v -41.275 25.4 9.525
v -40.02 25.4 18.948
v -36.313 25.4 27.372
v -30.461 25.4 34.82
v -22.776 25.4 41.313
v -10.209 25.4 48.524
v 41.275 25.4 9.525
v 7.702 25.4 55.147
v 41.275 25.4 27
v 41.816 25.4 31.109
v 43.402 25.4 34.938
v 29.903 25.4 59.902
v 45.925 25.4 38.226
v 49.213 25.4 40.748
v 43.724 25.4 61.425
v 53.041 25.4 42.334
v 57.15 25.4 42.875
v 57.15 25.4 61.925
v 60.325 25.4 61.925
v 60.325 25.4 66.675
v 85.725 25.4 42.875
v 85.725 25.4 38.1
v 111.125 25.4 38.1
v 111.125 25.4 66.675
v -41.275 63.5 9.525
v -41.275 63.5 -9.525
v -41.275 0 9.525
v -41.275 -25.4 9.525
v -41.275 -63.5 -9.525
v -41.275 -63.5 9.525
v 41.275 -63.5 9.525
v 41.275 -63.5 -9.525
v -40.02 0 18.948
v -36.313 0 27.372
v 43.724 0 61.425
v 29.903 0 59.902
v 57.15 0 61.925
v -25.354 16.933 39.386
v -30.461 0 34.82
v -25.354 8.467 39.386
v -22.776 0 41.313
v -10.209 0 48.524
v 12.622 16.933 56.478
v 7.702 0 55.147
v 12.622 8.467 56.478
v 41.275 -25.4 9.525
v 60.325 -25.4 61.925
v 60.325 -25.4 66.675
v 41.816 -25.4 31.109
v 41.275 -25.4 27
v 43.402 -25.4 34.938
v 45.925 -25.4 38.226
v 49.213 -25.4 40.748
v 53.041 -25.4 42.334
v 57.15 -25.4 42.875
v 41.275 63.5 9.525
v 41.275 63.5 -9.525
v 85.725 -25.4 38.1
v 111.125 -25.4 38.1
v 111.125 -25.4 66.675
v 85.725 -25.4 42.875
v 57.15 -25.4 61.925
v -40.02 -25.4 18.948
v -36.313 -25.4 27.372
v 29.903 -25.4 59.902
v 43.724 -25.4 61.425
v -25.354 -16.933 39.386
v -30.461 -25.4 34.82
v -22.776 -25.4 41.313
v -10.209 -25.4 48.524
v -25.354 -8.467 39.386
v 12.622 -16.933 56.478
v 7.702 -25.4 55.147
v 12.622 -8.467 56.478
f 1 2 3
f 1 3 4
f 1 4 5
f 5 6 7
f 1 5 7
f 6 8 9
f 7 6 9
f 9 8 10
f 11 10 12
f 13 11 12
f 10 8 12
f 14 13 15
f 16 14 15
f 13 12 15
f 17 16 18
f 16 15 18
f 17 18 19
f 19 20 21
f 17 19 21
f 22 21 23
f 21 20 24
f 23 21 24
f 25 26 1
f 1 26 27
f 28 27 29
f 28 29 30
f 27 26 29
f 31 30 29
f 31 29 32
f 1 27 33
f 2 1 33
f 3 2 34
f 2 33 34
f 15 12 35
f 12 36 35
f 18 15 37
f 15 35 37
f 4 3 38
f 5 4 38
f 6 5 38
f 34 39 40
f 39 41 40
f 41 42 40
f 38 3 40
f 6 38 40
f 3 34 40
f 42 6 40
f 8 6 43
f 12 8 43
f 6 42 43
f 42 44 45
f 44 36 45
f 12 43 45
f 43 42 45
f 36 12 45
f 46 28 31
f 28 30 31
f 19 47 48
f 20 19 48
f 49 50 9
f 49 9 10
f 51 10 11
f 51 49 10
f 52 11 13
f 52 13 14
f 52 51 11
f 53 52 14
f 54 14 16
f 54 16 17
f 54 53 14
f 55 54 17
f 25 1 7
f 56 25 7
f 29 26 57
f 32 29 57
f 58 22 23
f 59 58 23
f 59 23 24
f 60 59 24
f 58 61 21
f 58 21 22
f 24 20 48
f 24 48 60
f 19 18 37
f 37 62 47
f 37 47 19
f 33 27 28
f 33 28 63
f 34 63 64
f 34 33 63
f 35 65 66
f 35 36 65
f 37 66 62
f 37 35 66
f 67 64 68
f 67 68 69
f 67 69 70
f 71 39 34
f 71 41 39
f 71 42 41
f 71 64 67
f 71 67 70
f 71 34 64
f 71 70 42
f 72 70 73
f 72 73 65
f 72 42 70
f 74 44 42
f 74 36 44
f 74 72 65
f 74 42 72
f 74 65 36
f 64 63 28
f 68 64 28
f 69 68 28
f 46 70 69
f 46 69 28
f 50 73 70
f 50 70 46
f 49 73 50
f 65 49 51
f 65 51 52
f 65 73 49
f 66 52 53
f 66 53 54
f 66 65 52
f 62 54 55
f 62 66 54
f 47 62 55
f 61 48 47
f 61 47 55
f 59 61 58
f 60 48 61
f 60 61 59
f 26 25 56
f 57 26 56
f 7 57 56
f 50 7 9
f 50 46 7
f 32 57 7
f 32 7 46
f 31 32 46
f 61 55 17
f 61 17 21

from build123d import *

# Parameters (mm, degrees)
F0_W     = 82.55
F0_H     = 19.05
F1_DEPTH = 63.5
F2_DEPTH = 25.4
F0_W_2   = 25.4
F3_DEPTH = 25.4
F4_DEPTH = 25.4
F0_H_2   = 4.7498
F5_DEPTH = 25.4


with BuildPart() as f1:
    # F0 (on Front) → F1 (new body, symmetric)
    with BuildSketch(Plane.XZ):
        Rectangle(F0_W, F0_H)
    extrude(amount=F1_DEPTH, both=True)

    # F0 (on Front) → F2 (join, symmetric)
    with BuildSketch(Plane.XZ):
        with BuildLine():
            Line((-41.275, 9.525), (41.275, 9.525))
            Line((41.275, 9.525), (41.275, 27.0002))
            ThreePointArc((41.275, 27.0002), (45.9246798487, 38.2255201513), (57.15, 42.8752))
            Line((57.15, 42.8752), (60.325, 42.8752))
            Line((60.325, 42.8752), (60.325, 61.9252))
            Line((60.325, 61.9252), (57.15, 61.9252))
            add(Edge.make_bspline(
                [(-41.275, 9.525), (-41.5499731898, 46.1455024779), (14.5141012144, 61.9252), (57.15, 61.9252)],
                knots=[0, 0, 0, 0, 111.5045361635, 111.5045361635, 111.5045361635, 111.5045361635], degree=3))
        make_face()
    extrude(amount=F2_DEPTH, both=True)

    # F0 (on Front) → F3 (join, symmetric)
    with BuildSketch(Plane.XZ):
        with Locations((73.025, 52.4002)):
            Rectangle(F0_W_2, F0_H)
    extrude(amount=F3_DEPTH, both=True)

    # F0 (on Front) → F4 (join, symmetric)
    with BuildSketch(Plane.XZ):
        Polygon((85.725, 66.675), (85.725, 61.9252), (85.725, 42.8752), (85.725, 38.1), (111.125, 38.1), (111.125, 66.675), align=None)
    extrude(amount=F4_DEPTH, both=True)

    # F0 (on Front) → F5 (join, symmetric)
    with BuildSketch(Plane.XZ):
        with Locations((73.025, 64.3001)):
            Rectangle(F0_W_2, F0_H_2)
    extrude(amount=F5_DEPTH, both=True)


solid = f1.part
